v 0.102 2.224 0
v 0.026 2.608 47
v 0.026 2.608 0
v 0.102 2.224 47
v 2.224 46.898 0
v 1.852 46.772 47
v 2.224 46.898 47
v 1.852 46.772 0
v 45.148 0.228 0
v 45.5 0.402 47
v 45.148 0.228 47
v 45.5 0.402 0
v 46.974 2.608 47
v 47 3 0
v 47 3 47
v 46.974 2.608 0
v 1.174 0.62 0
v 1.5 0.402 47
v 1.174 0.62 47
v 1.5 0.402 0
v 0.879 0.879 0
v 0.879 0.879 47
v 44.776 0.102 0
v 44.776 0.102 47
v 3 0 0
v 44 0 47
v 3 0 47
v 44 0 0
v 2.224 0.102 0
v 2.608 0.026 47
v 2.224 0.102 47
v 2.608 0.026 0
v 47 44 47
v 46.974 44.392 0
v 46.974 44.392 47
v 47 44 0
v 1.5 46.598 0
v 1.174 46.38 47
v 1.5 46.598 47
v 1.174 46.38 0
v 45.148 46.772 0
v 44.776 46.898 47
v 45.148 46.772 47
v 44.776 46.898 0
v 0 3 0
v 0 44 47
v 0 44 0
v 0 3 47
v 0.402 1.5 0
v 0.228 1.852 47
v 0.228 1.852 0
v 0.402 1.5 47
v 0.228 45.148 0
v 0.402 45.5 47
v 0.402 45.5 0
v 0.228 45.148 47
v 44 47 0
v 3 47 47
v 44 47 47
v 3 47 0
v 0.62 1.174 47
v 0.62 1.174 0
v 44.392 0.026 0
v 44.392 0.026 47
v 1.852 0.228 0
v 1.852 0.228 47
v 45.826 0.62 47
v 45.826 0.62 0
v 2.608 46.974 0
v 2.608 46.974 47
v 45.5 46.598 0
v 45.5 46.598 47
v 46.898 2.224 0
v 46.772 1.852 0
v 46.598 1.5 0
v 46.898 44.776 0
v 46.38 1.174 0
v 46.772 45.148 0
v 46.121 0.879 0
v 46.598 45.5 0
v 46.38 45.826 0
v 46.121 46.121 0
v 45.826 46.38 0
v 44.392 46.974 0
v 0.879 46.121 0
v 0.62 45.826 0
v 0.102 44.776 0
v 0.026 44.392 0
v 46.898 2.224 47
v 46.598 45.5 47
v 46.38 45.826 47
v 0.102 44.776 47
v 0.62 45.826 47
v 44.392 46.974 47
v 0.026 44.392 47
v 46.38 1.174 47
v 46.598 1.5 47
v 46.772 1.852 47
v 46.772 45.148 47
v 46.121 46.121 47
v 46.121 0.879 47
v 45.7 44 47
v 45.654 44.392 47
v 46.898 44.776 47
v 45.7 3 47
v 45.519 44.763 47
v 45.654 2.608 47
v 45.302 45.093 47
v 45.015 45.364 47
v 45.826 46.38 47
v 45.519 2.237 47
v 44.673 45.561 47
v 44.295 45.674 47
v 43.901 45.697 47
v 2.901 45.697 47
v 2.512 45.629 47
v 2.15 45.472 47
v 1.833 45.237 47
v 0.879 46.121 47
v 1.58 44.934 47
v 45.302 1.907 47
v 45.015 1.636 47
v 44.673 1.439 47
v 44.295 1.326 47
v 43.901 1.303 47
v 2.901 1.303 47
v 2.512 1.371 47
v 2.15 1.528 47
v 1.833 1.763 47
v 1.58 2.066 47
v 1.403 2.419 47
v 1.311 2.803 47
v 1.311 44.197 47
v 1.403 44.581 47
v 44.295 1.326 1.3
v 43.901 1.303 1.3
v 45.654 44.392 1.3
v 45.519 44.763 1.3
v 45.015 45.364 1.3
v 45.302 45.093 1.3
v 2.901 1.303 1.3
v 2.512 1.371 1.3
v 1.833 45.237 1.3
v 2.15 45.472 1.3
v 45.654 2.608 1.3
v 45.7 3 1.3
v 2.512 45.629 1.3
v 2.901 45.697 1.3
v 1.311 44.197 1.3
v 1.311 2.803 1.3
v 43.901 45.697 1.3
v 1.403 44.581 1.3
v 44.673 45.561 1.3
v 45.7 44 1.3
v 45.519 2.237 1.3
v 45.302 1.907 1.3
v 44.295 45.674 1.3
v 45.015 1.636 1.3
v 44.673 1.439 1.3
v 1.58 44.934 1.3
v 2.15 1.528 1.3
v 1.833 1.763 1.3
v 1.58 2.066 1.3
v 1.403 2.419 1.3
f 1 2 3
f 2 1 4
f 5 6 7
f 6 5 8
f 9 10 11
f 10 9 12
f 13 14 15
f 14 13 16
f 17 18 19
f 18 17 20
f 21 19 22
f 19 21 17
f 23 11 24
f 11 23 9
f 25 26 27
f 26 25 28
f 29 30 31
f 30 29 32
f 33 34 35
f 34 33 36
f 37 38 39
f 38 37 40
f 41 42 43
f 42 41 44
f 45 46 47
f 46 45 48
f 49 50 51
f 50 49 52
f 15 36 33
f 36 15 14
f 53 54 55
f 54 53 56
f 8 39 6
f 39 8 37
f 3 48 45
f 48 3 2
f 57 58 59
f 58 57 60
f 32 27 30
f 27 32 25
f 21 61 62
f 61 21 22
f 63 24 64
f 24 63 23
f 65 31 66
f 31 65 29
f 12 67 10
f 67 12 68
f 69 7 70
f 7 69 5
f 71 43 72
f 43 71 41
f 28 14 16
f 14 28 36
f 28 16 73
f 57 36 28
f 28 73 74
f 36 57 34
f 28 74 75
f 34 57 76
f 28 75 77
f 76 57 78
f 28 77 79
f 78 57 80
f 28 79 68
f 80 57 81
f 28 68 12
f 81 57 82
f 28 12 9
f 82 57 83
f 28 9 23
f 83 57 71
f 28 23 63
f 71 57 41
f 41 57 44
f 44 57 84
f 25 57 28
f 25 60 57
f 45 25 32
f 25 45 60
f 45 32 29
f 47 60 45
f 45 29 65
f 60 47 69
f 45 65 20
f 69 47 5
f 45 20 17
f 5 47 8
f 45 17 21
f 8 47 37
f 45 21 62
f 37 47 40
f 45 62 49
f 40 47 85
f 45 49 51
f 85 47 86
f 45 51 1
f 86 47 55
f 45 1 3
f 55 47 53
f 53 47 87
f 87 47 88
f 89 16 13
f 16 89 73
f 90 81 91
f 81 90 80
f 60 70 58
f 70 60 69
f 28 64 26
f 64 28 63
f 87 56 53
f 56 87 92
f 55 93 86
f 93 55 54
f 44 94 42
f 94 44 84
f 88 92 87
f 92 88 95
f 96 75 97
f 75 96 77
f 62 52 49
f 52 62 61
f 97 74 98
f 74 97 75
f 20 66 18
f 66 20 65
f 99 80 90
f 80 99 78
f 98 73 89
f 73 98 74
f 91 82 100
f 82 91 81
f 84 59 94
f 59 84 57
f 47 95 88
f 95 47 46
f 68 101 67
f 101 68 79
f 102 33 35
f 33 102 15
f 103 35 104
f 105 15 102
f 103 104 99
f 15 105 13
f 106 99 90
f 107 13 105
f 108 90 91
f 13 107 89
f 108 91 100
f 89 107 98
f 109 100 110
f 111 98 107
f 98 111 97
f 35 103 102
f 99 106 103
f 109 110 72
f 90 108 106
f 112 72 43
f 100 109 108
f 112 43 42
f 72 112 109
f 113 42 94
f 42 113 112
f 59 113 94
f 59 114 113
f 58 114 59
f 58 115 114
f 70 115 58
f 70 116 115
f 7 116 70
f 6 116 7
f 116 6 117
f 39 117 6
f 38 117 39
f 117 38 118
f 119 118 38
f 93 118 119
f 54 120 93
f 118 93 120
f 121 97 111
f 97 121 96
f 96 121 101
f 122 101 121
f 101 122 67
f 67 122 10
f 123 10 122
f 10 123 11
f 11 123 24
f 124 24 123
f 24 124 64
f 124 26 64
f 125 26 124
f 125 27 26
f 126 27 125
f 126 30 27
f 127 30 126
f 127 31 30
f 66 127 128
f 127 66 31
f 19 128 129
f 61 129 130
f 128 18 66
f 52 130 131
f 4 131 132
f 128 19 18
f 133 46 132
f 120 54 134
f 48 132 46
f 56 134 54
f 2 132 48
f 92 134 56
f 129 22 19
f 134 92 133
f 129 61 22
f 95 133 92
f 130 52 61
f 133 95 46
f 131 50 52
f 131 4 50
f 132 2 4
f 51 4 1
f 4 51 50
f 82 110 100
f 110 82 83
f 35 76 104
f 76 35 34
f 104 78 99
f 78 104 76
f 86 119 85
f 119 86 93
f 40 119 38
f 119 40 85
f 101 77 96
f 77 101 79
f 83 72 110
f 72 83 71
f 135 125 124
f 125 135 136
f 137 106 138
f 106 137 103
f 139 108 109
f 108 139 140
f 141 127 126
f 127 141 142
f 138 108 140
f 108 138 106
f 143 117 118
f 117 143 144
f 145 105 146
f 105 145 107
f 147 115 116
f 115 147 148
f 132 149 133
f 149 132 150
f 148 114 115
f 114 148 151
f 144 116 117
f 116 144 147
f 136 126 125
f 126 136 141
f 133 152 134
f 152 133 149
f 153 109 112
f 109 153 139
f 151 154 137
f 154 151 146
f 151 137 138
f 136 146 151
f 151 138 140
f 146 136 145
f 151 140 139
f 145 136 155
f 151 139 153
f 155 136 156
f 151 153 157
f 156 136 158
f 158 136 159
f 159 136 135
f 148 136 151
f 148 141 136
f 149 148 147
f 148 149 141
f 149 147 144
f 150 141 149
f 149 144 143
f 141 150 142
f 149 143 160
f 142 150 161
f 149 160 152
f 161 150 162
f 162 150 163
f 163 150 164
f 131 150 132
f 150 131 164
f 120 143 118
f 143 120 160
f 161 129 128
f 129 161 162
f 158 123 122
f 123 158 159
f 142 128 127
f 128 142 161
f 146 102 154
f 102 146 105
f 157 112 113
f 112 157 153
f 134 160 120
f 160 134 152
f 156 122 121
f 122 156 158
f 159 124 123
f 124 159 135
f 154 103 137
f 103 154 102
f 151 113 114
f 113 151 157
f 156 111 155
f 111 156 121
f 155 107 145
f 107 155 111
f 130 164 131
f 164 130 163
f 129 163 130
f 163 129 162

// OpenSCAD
use <mylib.scad>;
p = .001;
pp = 2 * p;
t0 = 1;
module dice(tr=[0,0,0], ds = ds) {
  color("#DDDDDD")
  translate(tr) roundedCube([ds,ds,ds], 2, false);
}
module cup(xyz=[47,47,47], t = t0) {
  // roundedRect fustrum:
  // vt: offset of base & walls (thickness)
  module vcup(base_xyc, top_xyz, vt = 0) {
    bx = base_xyc[0] - 2*vt;
    by = base_xyc[1] - 2*vt;
    rc = base_xyc[2] - vt;
    bxy = [bx, by];
    scal = [(top_xyz[0] - 2*vt)/bx, (top_xyz[1] - 2*vt)/by];
    trr([0, 0, vt])
    linear_extrude(height = top_xyz[2], scale = scal) 
    trr([-bx/2, -by/2, 0]) roundedRect(bxy, rc);
  }
  x0 = xyz[0];
  y0 = xyz[1];
  z0 = xyz[2];
  rc = 3;
  dz = z0;
  dx0 = x0;
  dy0 = y0;
  dx1 = x0;
  dy1 = y0;
  vt = 1.3;

  trr([dx1/2, dy1/2, 0]) intersection() 
  {
    // cup:
    difference() {
      vcup([dx0, dy0, rc], [dx1, dy1, dz], 0);
      vcup([dx0, dy0, rc], [dx1, dy1, dz], vt);
    }
    cube(size=[dx1+2*vt, dy1+2*vt, 169], center = true);
  }
}

module robber(tr = [0,0,0]) {
  color("black") 
  translate(v = tr) rotate([0,90,0]) cylinder(r1 = rs/2, r2 = 3, h = 32);
}
// 
ibz = 14;
module slotbox(ch = ch, ss = false) {
  r1 = .1; r2 = 5;
  cz = 3; // cut a wide slot, reducing height of 'box' for 25mm slot
  // 2 + .5mm to meet the roundedBox corner:
  slotifyY([2*(cbz-ibz), cw-2.5*t0, 2*t0, r1], [0, -(ch-t0+p)/2, cbz], undef, 2, false)
  slotifyY2([ibz,        25,        2*t0, r2], [0, -(ch-t0+p)/2,   4], undef,     2, ss)
  children(0);
}
module sidebox(dx = 0, y1 = y1, ss = false) {
  dr = (dx == 0) ? 27/2 : 0;
  cylr = (dx == 0) ? dr + 1.6 : -2; // t0 + 1.2/2
  cylz = 16;
  translate([dx, ch/2 - t0, 0]) 
  rc([ -cylr , 2*cylr-t0/2, cylz], 0, 3, 2, t0) // tr, rotid, q, rad, t, ss
  rc([ cylr , 2*cylr-t0/2, cylz], 0, 0, 2, t0)  // tr, rotid, q, rad, t, ss
  rc([ 0 , cylr, cylz], 1, 2, 2, 2*t0)          // tr, rotid, q, rad, t, ss
  slotbox(-2*y1+pp, ss)
  translate([-cw/2, 0, 0]) {
  difference() {
    union() {
      box([cw, y1+t0, cbz]); // dice box
      // add cylinders, maybe 0-radius:
      translate([cylr, cylr, 0]) pipe(rrh = [cylr, cylr, cylz]);
      translate([cw-cylr, cylr, 0]) pipe(rrh = [cylr, cylr, cylz]);
    }
    union() {
      dw = cw - 2*cylr; dy = cylr;
      // cut access slot:
      translate([dw/2, 2*cylr - dy, t0]) cube([cw-dw , cylr, cbz]);
      translate([t0, t0, t0]) cube([cylr, cylr, cbz]);
      // translate([t0, cylr, cylz-3.8]) cube([2, 6, 4.1]); // for clip-hole
      translate([cw-cylr, t0, t0]) cube([cylr, cylr, cbz]);
    }
  }
  dskz = 12.5/9; // empirical
  atrans(loc, [[cylr+f, cylr+f, t0+f], undef, undef, undef, undef, 0])
    astack(10, [0,0,dskz])
    color("yellow") disk(dr, dskz-.1)  ;
  }
}
module disk(r, h) {
  linear_extrude(height = h) 
  circle(r);
}

// for cards and tray names:
font = "Nunito:style=Bold";
// font = ".SF Compact Rounded";
// font = ".SF NS Rounded";

// Each of 6 boxes:
module cardbox(name, cutaway = false) {
  // echo("cardbox: name=", name);
  cut = cutaway ? [10, ch+f, cbz+f] : [0, 0, 0] ;
  difference() 
  {
    slotbox()
    roundedBox([cw, ch, cbz], 1, t0, undef, true);   // round the outer corners
    translate([(-8-cw)/2, (-f-ch)/2, -p]) cube(cut); // cutaway view
  }
  // fulcrum:    cutaway = true to see alignment
  a2 = -4.0;  // angle of cards on fulcrum
  s = 10;     // y-size of fulcrum (was also fontsize)
  translate([0.0, -8, 1.0]) {
    color("red")
    trr([0, 0, 1]) cube([cw, s, 4], true);    // wide base
    color("blue")
    trr([0, 0, 2.1, [a2, 0, 0]]) cube([cw, s-1, 3], true); // top bar
  }

  fs = 10; // font size
  {
    translate([0, -25, t0-p]) 
    linear_extrude(height = .8) 
    text(name, valign = "center", halign = "center", size = fs, font =font);
  }

  // Stack of cards, tilted:
  trt = [-0, 1.8, 1.1];
  atrans(loc, [trt, undef, undef, undef, undef, 0])
  cards(name, a2);
}

// Stack of 24 Cards
// name: print a name
// tile: rotation around x-axis
// n: number in stack
module cards(name = "foo", tilt = 0, n = 24) {
  dz = .325;  // z-thickness per card
  dy = tan(tilt) * dz;
  astack(n, [ 0, 0, dz ]) 
    trr([-cardw/2, -cardh/2, 0, [tilt, 0, 0, [0, cardh, 0]]]) {
    color("#aabbcc2f") roundedCube([ cardw, cardh, dz-.05 ], 3, true);
    translate([cardw/2, cardh/2, 0]) 
    color("black") text(name, halign = "center", font = font);
  }
}

cardLocs = [[1, 0, "sheep"], [1, 1, "wheat"], [1, 2, "ore"],
            [0, 0, "wood"], [0, 1, "brick"], [0, 2, "dev"], 
            ];

module cardboxes(i0, i1, cut = false) {
  locs = cardLocs;
  i0 = def(i0, 0);
  i1 = def(i1, len(locs)-1);
  for (i = [i0: i1]) let (rc = locs[i]) 
    let(r = rc[0], c = rc[1], ry = r == 0 ? 0 : y1, name = rc[2])
  translate([c*(cw-t0), r*(ch-t0)+ry, 0])
  cardbox(name, cut);
}

function cutb(cw3 = cardw-11) = (cw - cw3)/2;
// viewport to cut from big lid
// t: z-depth of cut
module cutTop(t = tb) {
  // cut a viewport:
  // difference() 
  {
    cw3 = (cardw - 11);       // width of cutout
    dw = (cw - cw3) / 2;      // border around cutout
    dh = dw;                  // same border for height
    ch3 = ch - 2 * dh;        // height of cutout
    assert(dw + cw3 < cardw - 2 );
    // echo("cutTop: ", [dw, dh, -.5*tb], [cw, ch, t]);
    translate([dw, dh, -.5*tb])
     cube([cw3, ch3, t]);
  }
}

module addTop() {
  ta = 1; hw = 10;
  // short walls to keep cards from sliding out
  translate([ta, ta, p])
  box([-2*ta, -2*ta, hw+tb], [tw, tw, -1.5], [2, 2, 4]);
}

// cut holes in cardLid
module cardtops(i0, i1, cut = false) {
  locs = cardLocs;
  i0 = def(i0, 0);
  i1 = def(i1, len(locs)-1);
  difference() 
  {
    children(0); // the big lid
    for (i = [i0: i1]) let (rc = locs[i]) 
      let(r = rc[0], c = rc[1], ry = r == 0 ? 0 : y1)
      // echo("cardtops: ", [c*(cw-t0), r*(ch-t0)+ry, 0])
      translate([c*(cw-t0), r*(ch-t0)+ry, cbz+1])
        cutTop(2);
    // cutout grid above sideboxes:
    gh = 30; cs = 7;
    trr([0, (clh - gh) / 2, clz]) 
      cubesGrid(clw, gh, [cs, 5, 4], 1);
  }
  tw = 1; hw = cbz-cbz+1; hw0 = cbz - ibz-hw+1;
  // add retainer walls at end of  cardbox:
  for (i = [i0: i1]) let (rc = locs[i]) 
    let(r = rc[0], c = rc[1], ry = r == 0 ? 0 : y1, cz = 11)
    translate([c*(cw-t0), r*(ch-t0)+ry, 0])
    translate([1.5*t0, 1.5*t0, cbz-hw]) 
    {
      roundedBox([cw - 3*t0, ch-3*t0, hw+pp], 2, [tw, tw, -1.5], [2, 2, 4]);
      translate([cw/2, t0/2, -hw0/2-p])  cube([10, 1, hw0], true); // tab in slot
    }

  // retainer bar for disks
  dr = (true) ? 27/2 : 0; // disk radius
  cylr = (true) ? dr + 1.6: 0; // t0 + 1.2/2
  rr = 3; // reduce radius
  cylz = 16; kz = 1; cylz2 = cbz-cylz+kz;
  translate([ cylr/2, ch + t0 + cylr, cylz-kz]) 
  cube([cw-cylr, 1.5* t0, cylz2]);
}

// lid for cardsTray
// ambient:
// clw
// clh
// clz
// r180 (rotation & center) 
module cardsLid() {
  // align lid with box:
  p0 = -(t0+2*f);
  {
  // add clips:
  cx = 1+2*f; d0 = (t0 + cx/2); 
  tr = [p0, (lh-f)/2, cbz - clz + 4 -f]; // 4mm up from bottom edge
  clips(tr, [d0, clw-d0], 10, cx);

  cardtops()
  atrans(0, [[p0, p0, clz-lz +t0, r180]]) // flip in place; align with cardbox
    box([clw, clh, clz]);
  }
}

// size: [x: length, y: width_curved, z: height_curved]
// rt: radii of tray [bl, tl, tr, br]
// rc: radii of caps
// k0: cut_end default: cut max(top radii) -> k
module tray(size = 10, rt = 2, rc = 2, k0, t = t0) {
 s = is_list(size) ? size : [size,size,size]; // tube_size
 rm = is_list(rt) ? max(rt[1], rt[2]) : rt;   // round_max
 k = is_undef(k0) ? -rm : k0;
 translate([s[0], 0, 0+p])
 rotate([0, -90, 0])
 roundedTube([s[2], s[1], s[0]], rt, k, t);

 // endcaps
 hw0 = [s[2], s[1], 0];
 hwx = [s[2], s[1], s[0]];
 div(hw0, rc, k);
 div(hwx, rc, k);
}

// nx: columns of partTrays
// ny: rows of partTrays
nx = 1; ny = 4; 
module partTrays(mr, mc) {
  mr = def(mr, (loc >= ptloc && loc <= ptloc+3) ? loc-ptloc+1 : ny);
  mc = def(mc, nx);
  mx = t0 / nx; my = t0 / ny;
  tw2 = bw - 2 * t0 - mx;
  th2 = bh - 2 * t0 - my;
  tw = tw2/nx;
  th = th2/ny;
  px0 = (bw - nx * tw) / 2;
  py0 = (bh - ny * th) / 2;
  roadx = (1+2/16) * 25.4;  // note road is (1 x 3/16 x 3/16)
  echo("partsTray: roadx=", roadx, "interior width=", th-my-3*t0);
  module partstray(tr=[0,0,0]) {
    // old tray: 85,500 mm^3, now: 85,868.5 mm^3 (less for radius)
    // echo("partstray: tw, th, boxz-1=", tw, th, boxz-2.1, tw*th*(boxz-2.1) );
    rt = 10;
    trayz = boxz - t0;
    translate(tr) {
      tray([tw - mx, th - my,  trayz + rt], rt, 2, -10 );
      div([trayz + rt, th-my, roadx + t0], rt, -rt);
    } 
  }
  astack(mc, [tw, 0, 0]) astack(mr, [0, th, 0])
      partstray([px0, py0, 1]); // above the blue box
}

// cs: child size; begin grid @ (cs, cs+1)
// nc: columns
// nr: rows
module partsGrid(cs = 5, nc = 10, nr = 20) {
  x0 = cs;
  xi = (bw - cs) / nc;
  xm = bw - cs;
  y0 = cs + 1;
  yi = (bh - cs) / nr;
  ym = bh - cs;
  translate([0, 0, -t0])
  gridify([x0, xi, xm], [y0, yi, ym], 2) cube([cs, cs, cs]);
}

module clip(tr, wx = 2, ly = 3, hz = 2) {
  translate(tr) cube([wx, ly, hz], true);
}
module hole(tr, wx = 2, ly = 3, hz = 2) {
  translate(tr) cube([wx, ly+5*f, hz+5*f], true);
}
module clips(tr, xa, dy = 30, wx = 2, ly = 3, hz = 2) {
  for (x = xa, iy = [-dy: dy: dy]) 
  {
    clip([tr[0]+x, tr[1]+iy, tr[2]], wx, ly, hz);
    // clip([tr[0]+x1, tr[1]+iy, tr[2]], wx, ly, hz);
  }
}
module holes(tr, xa, dy = 30, wx = 2, ly = 3, hz = 2) {
  for (x = xa, iy = [-dy: dy: dy]) 
  {
    hole([tr[0]+x, tr[1]+iy, tr[2]], wx, ly, hz);
  }
}

// lid z:
lz = 11;
// depth to clips/holes
sd = 7;

module partsLid(lw = lw, lh = lh, lz = lz, sd = sd) {
  sd = is_undef(sd) ? 7 : sd;
  union() {
  translate([f, -f, 0])
  difference() {
    box([lw, lh, lz]); // partslid
    partsGrid();
  }

  // add clips:
  cx = 1+f; d0 = (t0+cx/2);
  tr = [f, (lh-f)/2, t0+sd+f];
  color("red") clips(tr, [00+d0, lw-d0], 30, cx);
  }
}

// bluebox: holds the partTrays (with partsLid)
// parts vol = ~79,000 cu-mm
module bluebox() {
  hm = .8;
  difference() {
    color("lightblue")
    box([bw, bh, boxz]);
    holes([0, bh/2, boxz-sd], [t0/2, bw-t0/2], 30); // for clips

    for (ix = [0 : nx-1], iy = [0 : ny-1]) 
      let(hw = hm*bw/nx, hh = hm*bh/ny)
      translate([ix * bw/nx +hw/2+ hw*(1-hm)/2, iy*bh/ny + hh/2 + hh*(1-hm)/2  , -t0])
      cube([hw, hh, 5], true); // open bottom
  }
}

f = .18;  // snug fudge factor

// trays for cards, player-bits, dice, robber, disks
tb = 3; // thickness of base

// depth of boxes: city=19; 8-10-cards, 3-lever, 2-holding (+2 for bottom!)
boxz = 26; // bluebox for parts
cbz = 18;  // cardbox height: independent of bluebox: boxz
cardw = 54; cw = cardw + 2 + 2 + 2*t0; // cw = cardw + sleeve + gap + box wall
cardh = 81; ch = cardh + 2 + 2 + 2*t0; // ch = cardh + sleeve + GAP + box wall
// dice size
ds = 16;
// robber size
rs = 15;

// tray height = 206
th = 206;
// size of gap between two rows of boxes:
y1 = th - 2*(ch)-t0;
// tw = total width - t0;
tw = 3 * (cw - t0);
// bluebox width:
bw = (282-30) - tw - 2; // inset by 2mm
// bluebox 'height': (max 220 due to plate size of FlashForge!)
bh = 2 * ch + y1 - t0;  // 220 - 2*t0
// partsLid:
lw = bw + 2*t0 + 2*f;
lh = bh + 2*t0 + 2*f;

echo("y1=", y1, "bw=", bw, "bh=", bh, "tw=", tw, "th=", th );
echo("parts vol: bw*bh*(boxz-2*t0)", (bw-4)*(bh-8)*(boxz-2)/4);

// cardsLid metrics:
clw = 3 * (cw) + 4*f;
clh = 2 * (ch) + 0 + y1 + t0 + 4*f; // bh + 2*t0 + 2*f
clz = lz + (cbz-cbz); // lidz
// rotate in place:
r180 = [0, 180, 0, [clw/2, clh/2, cbz/2]];
ptloc = 13;

// 0: all, 1: cardboxes, 2: bluebox & partsLid, 3: partTrays, 4: cardsLid,
// 5: packed, 6: bluebox & partsLid (fit); 7: bluebox & partTrays (fit)
// 8: bluebox, 9: cup, 10..13: partsBox
loc = 9;

// CardTray-1:
difference() {
  atrans(loc, [[cw/2, ch/2, 0], 0, undef, undef, undef, 0])
  {
    cardboxes();
    for (i = [0 : 2]) sidebox((cw-1)*i);
  }
  {
    // cut holes for clips:
    dx = 1.5*t0; 
    holes([0, (lh-f)/2, cbz - lz + 4], [-t0 + dx, tw+2*t0 - dx], 10, 4);
  }
}
// cardsLid-4
atrans(loc, [[-clw-2*t0, 0, t0, r180], // 0: placement to view
              2, undef, undef,
              [0, 0, t0, r180],    // 4: placement to print
              [0, 0, 0],           // 5: align with box
              ]) {
  cardsLid(); // loc: { 0, u, u, u, 4, 5 }
}

atrans(loc, [[cw+t0, ch+t0, t0], undef, undef, undef, undef, 0]) {
  astack(2, [ds+f, 0, 0]) dice([0, 0, 0]);
  robber([cw, t0 + rs/2, rs/2]);
}

// partsBox-2 w/Lid
bbx0 = bh; bby0 = th+t0;
atrans(loc, [[bbx0, bby0, 0, [0, 0, 90]], undef, [0, 0, 0], undef, undef, 0, 0, 0, 0]) 
  bluebox();

atrans(loc, [[bbx0-bh-t0, bby0-t0, 0, [0, 0, 90]], undef, [bw + 2, -t0, 0], undef, undef, 
             [bbx0+t0, bby0+lw-t0, boxz+t0, [0, 180, 90]], 5,
             ])
  partsLid(); // blueBox lid

// partTrays-3x4
atrans(loc, [[bbx0, bby0+bw, -t0, [0, 0, 90]], 
             undef, undef, 
             [0, 0, -t0],
             undef, 
             [bbx0, bby0, t0, [0, 0, 90]], undef,  5, undef, undef, 3, 3, 3, 3])
  partTrays();  // (0,0);            // partTrays
// Roads: 1 X 3/16 X 3/16
// City: 3/4 X 3/4 X 10mm
// House: 9 X 14 X 12 mm
// rl = 25.4; rw = rl * 3/16; rh = rw;
// translate([cw-1, 7, t0]) rotate([0,0,90]) partTrays(0,0);

atrans(loc, [[clw,0,0], undef, undef, undef, undef, 0, undef, undef, undef, 
             [0, 0, 0]]) cup();

// show printer plate:
*atrans(loc, [undef, undef, undef, undef, undef, [-1, -1, -2]]) 
 color("tan") cube([220, 220, 1]);
// show packing box:
atrans(loc, [[-230, -2, -1.1], undef, undef, undef, undef, [-.5, -1.5, -1]]) 
 color("brown") cube([230, 285, 1]);
